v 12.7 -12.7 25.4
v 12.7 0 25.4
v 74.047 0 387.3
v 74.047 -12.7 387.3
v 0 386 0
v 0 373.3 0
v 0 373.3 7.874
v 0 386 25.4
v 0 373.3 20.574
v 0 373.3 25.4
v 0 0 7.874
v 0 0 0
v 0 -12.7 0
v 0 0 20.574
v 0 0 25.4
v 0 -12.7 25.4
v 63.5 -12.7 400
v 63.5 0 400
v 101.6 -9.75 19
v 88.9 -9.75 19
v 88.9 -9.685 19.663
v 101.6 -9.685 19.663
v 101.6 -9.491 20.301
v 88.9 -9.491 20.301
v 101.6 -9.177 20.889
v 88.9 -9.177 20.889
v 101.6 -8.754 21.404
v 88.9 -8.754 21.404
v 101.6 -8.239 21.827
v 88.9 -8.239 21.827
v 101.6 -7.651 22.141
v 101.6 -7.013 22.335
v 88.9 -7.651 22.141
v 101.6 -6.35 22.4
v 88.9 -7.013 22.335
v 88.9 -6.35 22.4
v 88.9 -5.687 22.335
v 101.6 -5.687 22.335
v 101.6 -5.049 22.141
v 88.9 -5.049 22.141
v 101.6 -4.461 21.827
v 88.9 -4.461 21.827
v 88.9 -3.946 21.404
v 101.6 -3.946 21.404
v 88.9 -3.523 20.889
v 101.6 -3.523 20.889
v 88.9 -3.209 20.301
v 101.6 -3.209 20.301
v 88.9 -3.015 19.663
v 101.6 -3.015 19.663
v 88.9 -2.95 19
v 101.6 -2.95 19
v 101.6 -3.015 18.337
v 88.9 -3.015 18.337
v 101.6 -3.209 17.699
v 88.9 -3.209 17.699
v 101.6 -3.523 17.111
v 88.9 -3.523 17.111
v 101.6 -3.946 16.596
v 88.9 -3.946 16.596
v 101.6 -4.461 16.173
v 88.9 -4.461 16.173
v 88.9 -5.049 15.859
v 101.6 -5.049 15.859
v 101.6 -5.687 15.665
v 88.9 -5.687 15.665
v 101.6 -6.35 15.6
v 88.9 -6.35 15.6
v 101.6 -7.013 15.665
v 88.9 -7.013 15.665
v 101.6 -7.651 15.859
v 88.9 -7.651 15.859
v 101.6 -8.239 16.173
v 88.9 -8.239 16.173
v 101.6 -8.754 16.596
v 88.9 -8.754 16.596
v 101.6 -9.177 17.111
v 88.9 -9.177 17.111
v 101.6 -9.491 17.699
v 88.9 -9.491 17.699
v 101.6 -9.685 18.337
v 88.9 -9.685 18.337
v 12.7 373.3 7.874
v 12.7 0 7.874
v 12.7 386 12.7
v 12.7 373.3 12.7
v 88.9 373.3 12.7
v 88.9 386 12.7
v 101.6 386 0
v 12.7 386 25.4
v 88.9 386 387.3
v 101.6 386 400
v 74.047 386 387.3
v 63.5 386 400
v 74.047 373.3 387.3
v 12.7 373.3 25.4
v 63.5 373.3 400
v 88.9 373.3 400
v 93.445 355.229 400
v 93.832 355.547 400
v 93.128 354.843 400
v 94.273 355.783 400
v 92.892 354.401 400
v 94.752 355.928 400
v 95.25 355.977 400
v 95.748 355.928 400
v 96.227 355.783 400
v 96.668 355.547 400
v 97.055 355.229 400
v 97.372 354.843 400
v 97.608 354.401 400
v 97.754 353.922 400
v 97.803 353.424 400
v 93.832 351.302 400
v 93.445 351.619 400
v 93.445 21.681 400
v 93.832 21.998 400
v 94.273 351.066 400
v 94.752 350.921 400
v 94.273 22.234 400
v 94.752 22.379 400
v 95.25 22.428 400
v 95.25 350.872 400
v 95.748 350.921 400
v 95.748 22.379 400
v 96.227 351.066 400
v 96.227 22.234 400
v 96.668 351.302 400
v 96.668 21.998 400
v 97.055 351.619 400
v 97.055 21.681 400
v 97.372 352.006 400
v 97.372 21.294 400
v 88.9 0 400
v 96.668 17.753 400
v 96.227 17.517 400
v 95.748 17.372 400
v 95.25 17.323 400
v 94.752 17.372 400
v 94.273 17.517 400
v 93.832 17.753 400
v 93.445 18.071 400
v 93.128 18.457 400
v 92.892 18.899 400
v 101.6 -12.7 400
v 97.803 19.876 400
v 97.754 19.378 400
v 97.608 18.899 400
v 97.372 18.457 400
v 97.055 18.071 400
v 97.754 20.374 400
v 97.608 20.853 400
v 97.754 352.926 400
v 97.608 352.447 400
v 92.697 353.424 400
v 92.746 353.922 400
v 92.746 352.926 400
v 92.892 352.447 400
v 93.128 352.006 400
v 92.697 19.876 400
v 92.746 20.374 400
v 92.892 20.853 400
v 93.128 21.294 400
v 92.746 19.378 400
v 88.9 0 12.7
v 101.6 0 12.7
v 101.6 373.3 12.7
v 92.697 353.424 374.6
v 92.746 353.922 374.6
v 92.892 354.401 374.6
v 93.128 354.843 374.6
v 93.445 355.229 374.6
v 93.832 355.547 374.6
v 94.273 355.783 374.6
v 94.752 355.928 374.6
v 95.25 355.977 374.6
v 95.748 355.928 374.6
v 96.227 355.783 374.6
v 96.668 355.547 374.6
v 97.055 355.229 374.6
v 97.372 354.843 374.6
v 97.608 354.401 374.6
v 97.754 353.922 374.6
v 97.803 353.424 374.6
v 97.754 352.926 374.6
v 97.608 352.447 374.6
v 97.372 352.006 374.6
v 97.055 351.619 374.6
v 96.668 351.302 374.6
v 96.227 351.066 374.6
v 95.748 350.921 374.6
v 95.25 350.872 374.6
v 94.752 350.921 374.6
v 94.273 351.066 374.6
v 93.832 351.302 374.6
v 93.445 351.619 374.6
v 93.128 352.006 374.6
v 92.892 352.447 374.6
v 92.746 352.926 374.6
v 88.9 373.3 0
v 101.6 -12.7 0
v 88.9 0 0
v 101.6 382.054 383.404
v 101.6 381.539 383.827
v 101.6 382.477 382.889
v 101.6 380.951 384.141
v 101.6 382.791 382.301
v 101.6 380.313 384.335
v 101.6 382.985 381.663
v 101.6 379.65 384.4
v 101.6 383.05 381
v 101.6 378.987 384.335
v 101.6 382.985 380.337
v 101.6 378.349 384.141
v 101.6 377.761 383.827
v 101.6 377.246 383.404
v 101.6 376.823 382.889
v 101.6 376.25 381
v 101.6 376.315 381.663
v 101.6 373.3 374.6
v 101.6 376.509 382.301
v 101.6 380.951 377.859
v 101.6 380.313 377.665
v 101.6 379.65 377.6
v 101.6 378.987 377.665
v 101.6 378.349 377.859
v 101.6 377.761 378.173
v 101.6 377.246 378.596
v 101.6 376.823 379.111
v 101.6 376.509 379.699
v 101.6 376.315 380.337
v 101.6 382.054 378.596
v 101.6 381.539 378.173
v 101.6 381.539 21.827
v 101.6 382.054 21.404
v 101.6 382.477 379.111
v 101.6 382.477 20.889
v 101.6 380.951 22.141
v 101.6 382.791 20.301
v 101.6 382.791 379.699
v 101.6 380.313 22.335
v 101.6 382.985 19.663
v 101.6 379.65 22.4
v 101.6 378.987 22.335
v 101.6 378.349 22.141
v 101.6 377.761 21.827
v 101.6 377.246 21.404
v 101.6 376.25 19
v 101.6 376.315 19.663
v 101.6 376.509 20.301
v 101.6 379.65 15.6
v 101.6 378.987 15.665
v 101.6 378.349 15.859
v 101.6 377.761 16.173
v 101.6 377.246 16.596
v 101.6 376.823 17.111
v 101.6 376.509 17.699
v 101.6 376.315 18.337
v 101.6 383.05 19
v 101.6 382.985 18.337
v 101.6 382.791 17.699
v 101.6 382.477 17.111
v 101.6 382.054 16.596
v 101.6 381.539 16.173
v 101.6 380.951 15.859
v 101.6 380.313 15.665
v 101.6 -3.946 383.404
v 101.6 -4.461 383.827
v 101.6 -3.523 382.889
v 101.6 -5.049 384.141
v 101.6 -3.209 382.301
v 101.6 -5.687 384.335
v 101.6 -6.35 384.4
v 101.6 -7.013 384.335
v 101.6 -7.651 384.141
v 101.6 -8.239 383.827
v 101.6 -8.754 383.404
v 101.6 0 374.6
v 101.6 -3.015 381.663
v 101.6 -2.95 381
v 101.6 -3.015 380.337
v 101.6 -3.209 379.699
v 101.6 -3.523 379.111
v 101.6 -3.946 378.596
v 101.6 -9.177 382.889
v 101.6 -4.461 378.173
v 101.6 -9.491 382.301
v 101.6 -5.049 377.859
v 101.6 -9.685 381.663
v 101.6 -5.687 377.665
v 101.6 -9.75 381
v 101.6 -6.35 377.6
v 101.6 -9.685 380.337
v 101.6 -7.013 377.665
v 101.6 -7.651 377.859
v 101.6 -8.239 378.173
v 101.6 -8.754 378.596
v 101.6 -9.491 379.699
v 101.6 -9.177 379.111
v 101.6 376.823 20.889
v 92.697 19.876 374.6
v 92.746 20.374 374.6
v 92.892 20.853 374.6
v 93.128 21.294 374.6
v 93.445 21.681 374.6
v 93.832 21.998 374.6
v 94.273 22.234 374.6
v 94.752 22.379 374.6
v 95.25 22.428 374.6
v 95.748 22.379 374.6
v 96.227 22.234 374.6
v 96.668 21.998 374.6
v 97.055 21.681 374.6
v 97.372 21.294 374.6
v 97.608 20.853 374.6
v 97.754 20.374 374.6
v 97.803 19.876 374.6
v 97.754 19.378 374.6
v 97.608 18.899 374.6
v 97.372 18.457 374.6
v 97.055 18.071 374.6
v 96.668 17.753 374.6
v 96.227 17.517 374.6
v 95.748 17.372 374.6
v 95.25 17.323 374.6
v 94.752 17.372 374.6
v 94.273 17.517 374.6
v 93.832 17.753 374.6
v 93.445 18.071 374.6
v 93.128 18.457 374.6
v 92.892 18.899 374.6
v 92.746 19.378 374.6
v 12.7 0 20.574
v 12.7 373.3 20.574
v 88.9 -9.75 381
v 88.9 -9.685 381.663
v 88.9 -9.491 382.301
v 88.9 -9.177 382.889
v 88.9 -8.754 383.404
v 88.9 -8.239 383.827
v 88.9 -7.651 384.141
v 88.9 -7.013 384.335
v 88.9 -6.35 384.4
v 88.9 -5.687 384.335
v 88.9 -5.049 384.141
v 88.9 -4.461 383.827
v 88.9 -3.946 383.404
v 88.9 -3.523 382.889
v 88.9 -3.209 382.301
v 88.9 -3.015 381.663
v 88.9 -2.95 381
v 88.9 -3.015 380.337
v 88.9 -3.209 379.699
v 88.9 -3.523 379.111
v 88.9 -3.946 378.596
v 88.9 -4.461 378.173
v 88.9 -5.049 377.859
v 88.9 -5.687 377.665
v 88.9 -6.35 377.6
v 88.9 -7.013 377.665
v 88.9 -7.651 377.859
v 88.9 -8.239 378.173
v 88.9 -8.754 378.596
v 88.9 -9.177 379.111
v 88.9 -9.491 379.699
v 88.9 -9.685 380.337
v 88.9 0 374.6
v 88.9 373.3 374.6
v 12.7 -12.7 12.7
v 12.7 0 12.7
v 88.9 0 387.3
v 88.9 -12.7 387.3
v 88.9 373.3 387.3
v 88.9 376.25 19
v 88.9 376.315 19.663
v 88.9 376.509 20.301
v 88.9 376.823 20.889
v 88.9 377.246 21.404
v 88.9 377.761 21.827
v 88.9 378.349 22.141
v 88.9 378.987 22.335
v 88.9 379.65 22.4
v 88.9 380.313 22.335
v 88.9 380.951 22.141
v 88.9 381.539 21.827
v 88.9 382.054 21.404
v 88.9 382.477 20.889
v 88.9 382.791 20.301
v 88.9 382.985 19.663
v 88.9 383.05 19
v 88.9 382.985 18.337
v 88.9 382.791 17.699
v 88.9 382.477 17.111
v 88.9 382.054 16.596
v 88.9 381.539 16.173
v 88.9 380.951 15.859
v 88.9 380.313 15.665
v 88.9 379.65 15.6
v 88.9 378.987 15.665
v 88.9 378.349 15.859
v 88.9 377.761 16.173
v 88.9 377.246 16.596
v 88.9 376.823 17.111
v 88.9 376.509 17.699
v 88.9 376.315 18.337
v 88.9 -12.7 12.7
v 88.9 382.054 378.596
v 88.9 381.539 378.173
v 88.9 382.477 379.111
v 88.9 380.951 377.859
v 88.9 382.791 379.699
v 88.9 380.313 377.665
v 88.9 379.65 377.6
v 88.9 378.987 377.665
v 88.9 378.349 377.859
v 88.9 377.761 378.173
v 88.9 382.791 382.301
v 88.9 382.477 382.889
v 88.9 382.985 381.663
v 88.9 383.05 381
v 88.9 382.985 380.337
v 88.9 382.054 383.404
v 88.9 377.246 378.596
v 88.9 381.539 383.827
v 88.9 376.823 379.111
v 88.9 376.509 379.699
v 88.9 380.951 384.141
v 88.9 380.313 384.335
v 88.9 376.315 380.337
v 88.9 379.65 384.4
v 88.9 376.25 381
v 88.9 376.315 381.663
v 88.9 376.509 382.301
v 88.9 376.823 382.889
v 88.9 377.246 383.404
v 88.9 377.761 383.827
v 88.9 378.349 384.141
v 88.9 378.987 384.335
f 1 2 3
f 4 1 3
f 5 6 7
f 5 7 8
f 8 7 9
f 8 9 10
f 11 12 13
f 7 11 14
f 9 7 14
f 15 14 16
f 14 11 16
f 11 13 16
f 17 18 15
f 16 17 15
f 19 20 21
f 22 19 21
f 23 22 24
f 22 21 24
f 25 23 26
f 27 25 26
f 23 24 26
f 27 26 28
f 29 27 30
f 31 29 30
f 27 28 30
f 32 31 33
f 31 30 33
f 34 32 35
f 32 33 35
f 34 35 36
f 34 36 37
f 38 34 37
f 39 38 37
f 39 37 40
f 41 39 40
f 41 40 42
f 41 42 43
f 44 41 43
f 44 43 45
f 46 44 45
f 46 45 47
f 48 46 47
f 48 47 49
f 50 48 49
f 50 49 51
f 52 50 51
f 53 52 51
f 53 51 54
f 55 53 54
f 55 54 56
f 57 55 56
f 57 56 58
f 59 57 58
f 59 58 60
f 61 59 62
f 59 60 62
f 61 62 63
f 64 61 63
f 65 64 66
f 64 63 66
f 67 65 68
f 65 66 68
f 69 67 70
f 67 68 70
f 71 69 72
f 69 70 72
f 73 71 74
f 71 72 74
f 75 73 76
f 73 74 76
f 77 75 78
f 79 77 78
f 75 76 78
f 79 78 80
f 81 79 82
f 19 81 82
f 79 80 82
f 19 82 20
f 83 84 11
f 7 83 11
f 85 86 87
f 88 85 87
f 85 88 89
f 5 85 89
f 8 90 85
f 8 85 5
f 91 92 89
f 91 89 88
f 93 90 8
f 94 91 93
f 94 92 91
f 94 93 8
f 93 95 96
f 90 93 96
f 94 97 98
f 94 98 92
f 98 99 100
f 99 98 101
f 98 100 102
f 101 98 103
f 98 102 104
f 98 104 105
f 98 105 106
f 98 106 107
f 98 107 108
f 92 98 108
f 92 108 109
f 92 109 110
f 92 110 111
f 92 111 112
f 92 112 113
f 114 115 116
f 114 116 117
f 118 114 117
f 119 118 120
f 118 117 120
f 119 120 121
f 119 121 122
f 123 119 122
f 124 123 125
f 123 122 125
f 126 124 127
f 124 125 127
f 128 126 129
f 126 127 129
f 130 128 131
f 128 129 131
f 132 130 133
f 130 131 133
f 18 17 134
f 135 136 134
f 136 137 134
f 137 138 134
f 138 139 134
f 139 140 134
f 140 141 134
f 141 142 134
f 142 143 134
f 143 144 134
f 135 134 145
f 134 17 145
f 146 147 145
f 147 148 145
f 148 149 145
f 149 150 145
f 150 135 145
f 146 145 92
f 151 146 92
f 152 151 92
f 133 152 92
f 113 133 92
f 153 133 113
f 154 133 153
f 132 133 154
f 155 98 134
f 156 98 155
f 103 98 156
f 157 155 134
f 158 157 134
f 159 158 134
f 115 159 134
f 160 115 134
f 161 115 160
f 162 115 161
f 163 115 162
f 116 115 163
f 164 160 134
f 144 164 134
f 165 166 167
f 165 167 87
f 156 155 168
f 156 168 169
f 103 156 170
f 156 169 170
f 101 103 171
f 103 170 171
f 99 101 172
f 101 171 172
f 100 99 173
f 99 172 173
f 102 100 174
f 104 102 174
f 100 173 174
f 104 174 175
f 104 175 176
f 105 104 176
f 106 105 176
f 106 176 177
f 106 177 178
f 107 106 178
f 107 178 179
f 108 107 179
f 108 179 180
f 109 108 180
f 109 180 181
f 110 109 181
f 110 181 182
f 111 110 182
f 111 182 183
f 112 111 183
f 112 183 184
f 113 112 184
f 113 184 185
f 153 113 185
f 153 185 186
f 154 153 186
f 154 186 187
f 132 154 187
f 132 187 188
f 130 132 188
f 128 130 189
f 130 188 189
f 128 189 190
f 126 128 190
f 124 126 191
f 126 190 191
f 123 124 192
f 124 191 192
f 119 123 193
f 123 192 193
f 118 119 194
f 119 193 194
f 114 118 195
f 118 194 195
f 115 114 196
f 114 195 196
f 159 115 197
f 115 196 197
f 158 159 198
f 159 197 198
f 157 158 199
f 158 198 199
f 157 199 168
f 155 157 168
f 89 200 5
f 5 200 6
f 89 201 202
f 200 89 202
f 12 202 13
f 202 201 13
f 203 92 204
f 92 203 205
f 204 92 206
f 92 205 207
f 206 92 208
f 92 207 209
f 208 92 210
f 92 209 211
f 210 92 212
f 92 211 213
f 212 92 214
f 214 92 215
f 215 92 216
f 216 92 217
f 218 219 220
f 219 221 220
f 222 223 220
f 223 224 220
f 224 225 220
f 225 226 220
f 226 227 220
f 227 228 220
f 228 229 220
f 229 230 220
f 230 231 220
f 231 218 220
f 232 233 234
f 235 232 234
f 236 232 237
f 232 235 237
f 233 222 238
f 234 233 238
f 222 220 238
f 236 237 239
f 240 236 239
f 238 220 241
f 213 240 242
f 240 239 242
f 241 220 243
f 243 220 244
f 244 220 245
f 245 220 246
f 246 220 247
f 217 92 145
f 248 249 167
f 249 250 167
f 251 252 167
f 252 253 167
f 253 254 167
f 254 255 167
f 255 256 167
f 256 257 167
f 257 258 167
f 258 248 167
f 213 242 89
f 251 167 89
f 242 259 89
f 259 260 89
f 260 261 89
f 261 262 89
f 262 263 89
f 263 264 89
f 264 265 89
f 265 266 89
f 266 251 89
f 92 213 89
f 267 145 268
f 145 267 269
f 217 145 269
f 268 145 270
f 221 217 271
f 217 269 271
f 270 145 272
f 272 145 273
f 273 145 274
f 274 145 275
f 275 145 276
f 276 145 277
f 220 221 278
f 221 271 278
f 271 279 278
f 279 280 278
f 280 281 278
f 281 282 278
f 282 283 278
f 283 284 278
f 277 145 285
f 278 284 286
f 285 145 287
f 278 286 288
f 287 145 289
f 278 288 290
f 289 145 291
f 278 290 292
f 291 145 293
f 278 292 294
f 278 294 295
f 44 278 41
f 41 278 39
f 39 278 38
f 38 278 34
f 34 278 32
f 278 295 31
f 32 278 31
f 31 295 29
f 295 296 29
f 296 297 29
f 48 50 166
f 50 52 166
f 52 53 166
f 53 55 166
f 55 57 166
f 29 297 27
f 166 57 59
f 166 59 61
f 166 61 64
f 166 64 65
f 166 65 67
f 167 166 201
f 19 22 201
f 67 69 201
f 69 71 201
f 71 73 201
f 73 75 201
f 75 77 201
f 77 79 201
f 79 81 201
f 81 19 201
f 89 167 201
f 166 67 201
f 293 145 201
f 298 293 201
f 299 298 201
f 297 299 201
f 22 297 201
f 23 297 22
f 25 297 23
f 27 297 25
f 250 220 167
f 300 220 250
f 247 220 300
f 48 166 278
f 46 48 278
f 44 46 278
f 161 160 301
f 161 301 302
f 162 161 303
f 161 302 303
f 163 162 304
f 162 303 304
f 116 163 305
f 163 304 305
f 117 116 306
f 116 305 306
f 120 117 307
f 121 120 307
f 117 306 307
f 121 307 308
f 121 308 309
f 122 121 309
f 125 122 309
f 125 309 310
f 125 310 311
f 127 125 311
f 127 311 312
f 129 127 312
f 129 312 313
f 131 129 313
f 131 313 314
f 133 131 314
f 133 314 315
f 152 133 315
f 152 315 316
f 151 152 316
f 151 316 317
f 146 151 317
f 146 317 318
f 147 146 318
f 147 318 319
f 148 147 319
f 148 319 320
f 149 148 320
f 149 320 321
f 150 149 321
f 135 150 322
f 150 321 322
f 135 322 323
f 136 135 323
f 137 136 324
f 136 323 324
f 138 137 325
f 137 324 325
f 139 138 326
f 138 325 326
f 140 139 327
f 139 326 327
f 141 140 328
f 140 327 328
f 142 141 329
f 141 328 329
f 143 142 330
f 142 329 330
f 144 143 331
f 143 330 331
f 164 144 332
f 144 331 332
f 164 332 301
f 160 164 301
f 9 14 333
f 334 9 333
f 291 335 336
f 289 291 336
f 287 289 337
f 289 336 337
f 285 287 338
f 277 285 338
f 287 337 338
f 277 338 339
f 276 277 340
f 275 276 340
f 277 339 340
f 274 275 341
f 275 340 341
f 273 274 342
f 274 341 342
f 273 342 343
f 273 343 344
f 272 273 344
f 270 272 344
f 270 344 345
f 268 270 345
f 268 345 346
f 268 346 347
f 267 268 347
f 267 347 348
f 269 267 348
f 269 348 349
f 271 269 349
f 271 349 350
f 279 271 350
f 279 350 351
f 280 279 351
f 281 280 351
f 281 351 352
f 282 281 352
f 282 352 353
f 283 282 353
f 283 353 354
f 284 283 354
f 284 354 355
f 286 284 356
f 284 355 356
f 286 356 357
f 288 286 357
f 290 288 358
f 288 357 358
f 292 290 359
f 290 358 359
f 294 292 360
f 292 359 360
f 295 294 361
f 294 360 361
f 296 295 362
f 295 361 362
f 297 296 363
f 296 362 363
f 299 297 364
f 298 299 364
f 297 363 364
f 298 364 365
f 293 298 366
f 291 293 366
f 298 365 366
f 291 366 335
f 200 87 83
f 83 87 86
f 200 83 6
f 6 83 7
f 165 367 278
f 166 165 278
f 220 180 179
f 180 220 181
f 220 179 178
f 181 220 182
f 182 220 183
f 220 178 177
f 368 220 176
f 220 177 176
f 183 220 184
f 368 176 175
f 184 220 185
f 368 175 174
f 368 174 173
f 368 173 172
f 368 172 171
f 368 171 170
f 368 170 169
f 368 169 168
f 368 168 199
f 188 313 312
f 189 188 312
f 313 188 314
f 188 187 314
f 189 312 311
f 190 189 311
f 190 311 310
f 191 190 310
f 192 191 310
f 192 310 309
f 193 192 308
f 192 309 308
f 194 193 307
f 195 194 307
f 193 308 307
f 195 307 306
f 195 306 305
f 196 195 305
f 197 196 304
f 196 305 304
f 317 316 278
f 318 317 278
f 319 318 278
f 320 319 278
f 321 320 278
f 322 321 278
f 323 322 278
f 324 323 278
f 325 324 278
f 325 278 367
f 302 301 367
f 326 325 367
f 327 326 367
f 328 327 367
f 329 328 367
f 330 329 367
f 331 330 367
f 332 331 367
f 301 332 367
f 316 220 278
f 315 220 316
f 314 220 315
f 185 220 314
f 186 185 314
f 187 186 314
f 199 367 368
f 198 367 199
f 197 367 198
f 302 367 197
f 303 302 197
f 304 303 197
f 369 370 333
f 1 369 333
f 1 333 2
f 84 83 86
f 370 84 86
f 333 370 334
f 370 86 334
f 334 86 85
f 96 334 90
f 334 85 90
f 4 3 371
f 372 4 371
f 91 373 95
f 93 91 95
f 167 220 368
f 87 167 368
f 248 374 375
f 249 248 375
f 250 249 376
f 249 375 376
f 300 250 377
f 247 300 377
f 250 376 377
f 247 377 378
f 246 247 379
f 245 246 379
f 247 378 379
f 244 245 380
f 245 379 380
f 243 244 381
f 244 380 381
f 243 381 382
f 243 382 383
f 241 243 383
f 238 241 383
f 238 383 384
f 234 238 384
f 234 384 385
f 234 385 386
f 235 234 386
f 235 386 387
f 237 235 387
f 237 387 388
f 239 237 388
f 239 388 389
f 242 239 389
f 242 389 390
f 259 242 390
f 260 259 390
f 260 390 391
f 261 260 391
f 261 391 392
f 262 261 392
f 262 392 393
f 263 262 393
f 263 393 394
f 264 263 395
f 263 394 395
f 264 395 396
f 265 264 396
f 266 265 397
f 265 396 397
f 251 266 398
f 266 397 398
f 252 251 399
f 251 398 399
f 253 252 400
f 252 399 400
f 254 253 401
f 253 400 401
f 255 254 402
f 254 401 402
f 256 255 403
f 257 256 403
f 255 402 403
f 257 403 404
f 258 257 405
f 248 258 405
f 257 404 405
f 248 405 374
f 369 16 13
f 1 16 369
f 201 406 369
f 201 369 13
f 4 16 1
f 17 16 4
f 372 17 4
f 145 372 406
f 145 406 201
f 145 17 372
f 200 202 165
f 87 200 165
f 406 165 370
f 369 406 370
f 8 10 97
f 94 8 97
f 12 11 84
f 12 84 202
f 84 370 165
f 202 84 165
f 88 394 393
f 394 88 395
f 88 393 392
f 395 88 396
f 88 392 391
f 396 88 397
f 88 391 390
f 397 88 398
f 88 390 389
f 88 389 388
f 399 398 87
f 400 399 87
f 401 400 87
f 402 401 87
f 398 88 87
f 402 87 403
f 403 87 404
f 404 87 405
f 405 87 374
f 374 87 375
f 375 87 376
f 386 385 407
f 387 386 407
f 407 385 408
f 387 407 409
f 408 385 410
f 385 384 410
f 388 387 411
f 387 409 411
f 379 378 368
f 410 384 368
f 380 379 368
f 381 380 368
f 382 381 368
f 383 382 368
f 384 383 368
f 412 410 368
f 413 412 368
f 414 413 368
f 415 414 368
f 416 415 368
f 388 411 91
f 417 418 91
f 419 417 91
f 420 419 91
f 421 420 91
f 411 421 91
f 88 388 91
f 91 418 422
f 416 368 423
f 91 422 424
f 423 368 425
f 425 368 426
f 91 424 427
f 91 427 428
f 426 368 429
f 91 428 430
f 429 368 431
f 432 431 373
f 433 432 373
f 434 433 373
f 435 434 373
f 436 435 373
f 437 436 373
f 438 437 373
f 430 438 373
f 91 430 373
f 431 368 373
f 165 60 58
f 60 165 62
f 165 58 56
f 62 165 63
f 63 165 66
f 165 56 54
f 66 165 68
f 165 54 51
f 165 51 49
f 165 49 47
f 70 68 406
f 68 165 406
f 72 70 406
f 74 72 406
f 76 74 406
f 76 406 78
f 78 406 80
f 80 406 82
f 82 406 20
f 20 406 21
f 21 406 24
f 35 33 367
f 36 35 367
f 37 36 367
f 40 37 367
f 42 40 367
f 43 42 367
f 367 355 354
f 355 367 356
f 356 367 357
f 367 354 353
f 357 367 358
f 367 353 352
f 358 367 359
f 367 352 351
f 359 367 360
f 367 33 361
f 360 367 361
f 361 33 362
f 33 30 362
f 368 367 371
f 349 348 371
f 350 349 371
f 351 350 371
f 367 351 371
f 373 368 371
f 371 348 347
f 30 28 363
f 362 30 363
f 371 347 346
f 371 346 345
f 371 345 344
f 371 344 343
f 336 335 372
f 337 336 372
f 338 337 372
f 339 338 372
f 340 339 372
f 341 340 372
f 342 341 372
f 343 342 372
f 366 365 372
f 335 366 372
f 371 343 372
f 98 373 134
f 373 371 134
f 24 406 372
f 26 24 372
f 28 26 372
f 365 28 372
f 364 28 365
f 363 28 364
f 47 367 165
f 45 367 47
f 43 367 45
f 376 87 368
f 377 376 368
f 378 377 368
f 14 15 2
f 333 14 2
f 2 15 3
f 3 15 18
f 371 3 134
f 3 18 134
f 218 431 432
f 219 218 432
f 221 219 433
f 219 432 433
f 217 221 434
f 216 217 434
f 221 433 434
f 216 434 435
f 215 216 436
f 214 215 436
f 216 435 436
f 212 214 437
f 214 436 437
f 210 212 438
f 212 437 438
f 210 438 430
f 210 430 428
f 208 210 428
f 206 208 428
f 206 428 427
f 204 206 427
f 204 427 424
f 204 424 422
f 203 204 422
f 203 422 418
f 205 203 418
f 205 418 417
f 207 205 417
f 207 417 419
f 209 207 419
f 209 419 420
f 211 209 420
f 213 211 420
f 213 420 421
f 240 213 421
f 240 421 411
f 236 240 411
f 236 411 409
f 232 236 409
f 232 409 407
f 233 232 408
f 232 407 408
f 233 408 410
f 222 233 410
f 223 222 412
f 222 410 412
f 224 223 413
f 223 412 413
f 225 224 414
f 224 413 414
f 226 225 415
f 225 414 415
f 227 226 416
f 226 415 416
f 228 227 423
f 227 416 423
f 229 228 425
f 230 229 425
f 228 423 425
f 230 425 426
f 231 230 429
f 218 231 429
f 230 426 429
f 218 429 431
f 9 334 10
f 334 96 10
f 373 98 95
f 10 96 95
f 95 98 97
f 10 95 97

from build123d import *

# Parameters (mm, degrees)
F1_DEPTH = 12.7
F2_W     = 12.7
F2_H     = 12.7
F3_DEPTH = 373.29999
F5_DEPTH = 12.7
F7_D     = 6.8
F7_DEPTH = 15.75
F7_TIP   = 2.0429261047
F9_D     = 5.1054
F9_DEPTH = 30.48
F9_TIP   = 1.5338169022


# Not quite as in the source:
# - a feature names something its author has since deleted; it is built from what else it names


with BuildPart() as f1:
    # F0 (on Front) → F1 (new body)
    with BuildSketch(Plane.XZ):
        Polygon((0, 25.4), (0, 0), (101.6, 0), (101.6, 387.3), (101.6, 400), (63.5, 400), align=None)
        Polygon((88.9, 387.3), (88.9, 12.7), (12.7, 12.7), (12.7, 25.4), (74.047170315, 387.3), align=None, mode=Mode.SUBTRACT)
    extrude(amount=F1_DEPTH)

    # F2 (on face) → F3 (join)
    with BuildSketch(Plane(origin=(0, 0, 0), x_dir=(-1, 0, 0), z_dir=(0, 1, 0))):
        with Locations((-95.25, 6.35)):
            Rectangle(F2_W, F2_H)
        with Locations((-95.25, 393.65)):
            Rectangle(F2_W, F2_H)
        Polygon((-12.7, 20.574), (-12.7, 12.7), (-12.7, 7.874), (0, 7.874), (0, 20.574), align=None)
        with Locations((-95.25, 380.95)):
            Rectangle(F2_W, F2_H)
    extrude(amount=F3_DEPTH)

    # F4 (on face) → F5 (join)
    with BuildSketch(Plane(origin=(0, 373.29999, 0), x_dir=(-1, 0, 0), z_dir=(0, 1, 0))):
        Polygon((-101.6, 374.6), (-101.6, 12.7), (-88.9, 12.7), (-88.9, 239.3), (-88.9, 374.6), align=None)
        Polygon((-101.6, 12.7), (-101.6, 0), (0, 0), (0, 25.4), (-63.5, 400), (-88.9, 400), (-88.9, 387.3), (-74.047170315, 387.3), (-12.7, 25.4), (-12.7, 12.7), (-88.9, 12.7), align=None)
        Polygon((-101.6, 400), (-101.6, 374.6), (-88.9, 374.6), (-88.9, 387.3), (-88.9, 400), align=None)
    extrude(amount=F5_DEPTH)

    # F7
    with Locations(Plane.YZ.offset(101.6)):
        with Locations((-6.35, 19), (-6.35, 381), (379.64999, 381), (379.64999, 19)):
            Hole(F7_D / 2, depth=F7_DEPTH)
            with Locations((0, 0, -(F7_DEPTH + F7_TIP / 2))):  # 118° drill point
                Cone(0, F7_D / 2, F7_TIP, mode=Mode.SUBTRACT)

    # F9
    with Locations(Plane.XY.offset(400)):
        with Locations((95.25, 353.4243106842), (95.25, 19.8756793158)):
            Hole(F9_D / 2, depth=F9_DEPTH)
            with Locations((0, 0, -(F9_DEPTH + F9_TIP / 2))):  # 118° drill point
                Cone(0, F9_D / 2, F9_TIP, mode=Mode.SUBTRACT)


solid = f1.part
